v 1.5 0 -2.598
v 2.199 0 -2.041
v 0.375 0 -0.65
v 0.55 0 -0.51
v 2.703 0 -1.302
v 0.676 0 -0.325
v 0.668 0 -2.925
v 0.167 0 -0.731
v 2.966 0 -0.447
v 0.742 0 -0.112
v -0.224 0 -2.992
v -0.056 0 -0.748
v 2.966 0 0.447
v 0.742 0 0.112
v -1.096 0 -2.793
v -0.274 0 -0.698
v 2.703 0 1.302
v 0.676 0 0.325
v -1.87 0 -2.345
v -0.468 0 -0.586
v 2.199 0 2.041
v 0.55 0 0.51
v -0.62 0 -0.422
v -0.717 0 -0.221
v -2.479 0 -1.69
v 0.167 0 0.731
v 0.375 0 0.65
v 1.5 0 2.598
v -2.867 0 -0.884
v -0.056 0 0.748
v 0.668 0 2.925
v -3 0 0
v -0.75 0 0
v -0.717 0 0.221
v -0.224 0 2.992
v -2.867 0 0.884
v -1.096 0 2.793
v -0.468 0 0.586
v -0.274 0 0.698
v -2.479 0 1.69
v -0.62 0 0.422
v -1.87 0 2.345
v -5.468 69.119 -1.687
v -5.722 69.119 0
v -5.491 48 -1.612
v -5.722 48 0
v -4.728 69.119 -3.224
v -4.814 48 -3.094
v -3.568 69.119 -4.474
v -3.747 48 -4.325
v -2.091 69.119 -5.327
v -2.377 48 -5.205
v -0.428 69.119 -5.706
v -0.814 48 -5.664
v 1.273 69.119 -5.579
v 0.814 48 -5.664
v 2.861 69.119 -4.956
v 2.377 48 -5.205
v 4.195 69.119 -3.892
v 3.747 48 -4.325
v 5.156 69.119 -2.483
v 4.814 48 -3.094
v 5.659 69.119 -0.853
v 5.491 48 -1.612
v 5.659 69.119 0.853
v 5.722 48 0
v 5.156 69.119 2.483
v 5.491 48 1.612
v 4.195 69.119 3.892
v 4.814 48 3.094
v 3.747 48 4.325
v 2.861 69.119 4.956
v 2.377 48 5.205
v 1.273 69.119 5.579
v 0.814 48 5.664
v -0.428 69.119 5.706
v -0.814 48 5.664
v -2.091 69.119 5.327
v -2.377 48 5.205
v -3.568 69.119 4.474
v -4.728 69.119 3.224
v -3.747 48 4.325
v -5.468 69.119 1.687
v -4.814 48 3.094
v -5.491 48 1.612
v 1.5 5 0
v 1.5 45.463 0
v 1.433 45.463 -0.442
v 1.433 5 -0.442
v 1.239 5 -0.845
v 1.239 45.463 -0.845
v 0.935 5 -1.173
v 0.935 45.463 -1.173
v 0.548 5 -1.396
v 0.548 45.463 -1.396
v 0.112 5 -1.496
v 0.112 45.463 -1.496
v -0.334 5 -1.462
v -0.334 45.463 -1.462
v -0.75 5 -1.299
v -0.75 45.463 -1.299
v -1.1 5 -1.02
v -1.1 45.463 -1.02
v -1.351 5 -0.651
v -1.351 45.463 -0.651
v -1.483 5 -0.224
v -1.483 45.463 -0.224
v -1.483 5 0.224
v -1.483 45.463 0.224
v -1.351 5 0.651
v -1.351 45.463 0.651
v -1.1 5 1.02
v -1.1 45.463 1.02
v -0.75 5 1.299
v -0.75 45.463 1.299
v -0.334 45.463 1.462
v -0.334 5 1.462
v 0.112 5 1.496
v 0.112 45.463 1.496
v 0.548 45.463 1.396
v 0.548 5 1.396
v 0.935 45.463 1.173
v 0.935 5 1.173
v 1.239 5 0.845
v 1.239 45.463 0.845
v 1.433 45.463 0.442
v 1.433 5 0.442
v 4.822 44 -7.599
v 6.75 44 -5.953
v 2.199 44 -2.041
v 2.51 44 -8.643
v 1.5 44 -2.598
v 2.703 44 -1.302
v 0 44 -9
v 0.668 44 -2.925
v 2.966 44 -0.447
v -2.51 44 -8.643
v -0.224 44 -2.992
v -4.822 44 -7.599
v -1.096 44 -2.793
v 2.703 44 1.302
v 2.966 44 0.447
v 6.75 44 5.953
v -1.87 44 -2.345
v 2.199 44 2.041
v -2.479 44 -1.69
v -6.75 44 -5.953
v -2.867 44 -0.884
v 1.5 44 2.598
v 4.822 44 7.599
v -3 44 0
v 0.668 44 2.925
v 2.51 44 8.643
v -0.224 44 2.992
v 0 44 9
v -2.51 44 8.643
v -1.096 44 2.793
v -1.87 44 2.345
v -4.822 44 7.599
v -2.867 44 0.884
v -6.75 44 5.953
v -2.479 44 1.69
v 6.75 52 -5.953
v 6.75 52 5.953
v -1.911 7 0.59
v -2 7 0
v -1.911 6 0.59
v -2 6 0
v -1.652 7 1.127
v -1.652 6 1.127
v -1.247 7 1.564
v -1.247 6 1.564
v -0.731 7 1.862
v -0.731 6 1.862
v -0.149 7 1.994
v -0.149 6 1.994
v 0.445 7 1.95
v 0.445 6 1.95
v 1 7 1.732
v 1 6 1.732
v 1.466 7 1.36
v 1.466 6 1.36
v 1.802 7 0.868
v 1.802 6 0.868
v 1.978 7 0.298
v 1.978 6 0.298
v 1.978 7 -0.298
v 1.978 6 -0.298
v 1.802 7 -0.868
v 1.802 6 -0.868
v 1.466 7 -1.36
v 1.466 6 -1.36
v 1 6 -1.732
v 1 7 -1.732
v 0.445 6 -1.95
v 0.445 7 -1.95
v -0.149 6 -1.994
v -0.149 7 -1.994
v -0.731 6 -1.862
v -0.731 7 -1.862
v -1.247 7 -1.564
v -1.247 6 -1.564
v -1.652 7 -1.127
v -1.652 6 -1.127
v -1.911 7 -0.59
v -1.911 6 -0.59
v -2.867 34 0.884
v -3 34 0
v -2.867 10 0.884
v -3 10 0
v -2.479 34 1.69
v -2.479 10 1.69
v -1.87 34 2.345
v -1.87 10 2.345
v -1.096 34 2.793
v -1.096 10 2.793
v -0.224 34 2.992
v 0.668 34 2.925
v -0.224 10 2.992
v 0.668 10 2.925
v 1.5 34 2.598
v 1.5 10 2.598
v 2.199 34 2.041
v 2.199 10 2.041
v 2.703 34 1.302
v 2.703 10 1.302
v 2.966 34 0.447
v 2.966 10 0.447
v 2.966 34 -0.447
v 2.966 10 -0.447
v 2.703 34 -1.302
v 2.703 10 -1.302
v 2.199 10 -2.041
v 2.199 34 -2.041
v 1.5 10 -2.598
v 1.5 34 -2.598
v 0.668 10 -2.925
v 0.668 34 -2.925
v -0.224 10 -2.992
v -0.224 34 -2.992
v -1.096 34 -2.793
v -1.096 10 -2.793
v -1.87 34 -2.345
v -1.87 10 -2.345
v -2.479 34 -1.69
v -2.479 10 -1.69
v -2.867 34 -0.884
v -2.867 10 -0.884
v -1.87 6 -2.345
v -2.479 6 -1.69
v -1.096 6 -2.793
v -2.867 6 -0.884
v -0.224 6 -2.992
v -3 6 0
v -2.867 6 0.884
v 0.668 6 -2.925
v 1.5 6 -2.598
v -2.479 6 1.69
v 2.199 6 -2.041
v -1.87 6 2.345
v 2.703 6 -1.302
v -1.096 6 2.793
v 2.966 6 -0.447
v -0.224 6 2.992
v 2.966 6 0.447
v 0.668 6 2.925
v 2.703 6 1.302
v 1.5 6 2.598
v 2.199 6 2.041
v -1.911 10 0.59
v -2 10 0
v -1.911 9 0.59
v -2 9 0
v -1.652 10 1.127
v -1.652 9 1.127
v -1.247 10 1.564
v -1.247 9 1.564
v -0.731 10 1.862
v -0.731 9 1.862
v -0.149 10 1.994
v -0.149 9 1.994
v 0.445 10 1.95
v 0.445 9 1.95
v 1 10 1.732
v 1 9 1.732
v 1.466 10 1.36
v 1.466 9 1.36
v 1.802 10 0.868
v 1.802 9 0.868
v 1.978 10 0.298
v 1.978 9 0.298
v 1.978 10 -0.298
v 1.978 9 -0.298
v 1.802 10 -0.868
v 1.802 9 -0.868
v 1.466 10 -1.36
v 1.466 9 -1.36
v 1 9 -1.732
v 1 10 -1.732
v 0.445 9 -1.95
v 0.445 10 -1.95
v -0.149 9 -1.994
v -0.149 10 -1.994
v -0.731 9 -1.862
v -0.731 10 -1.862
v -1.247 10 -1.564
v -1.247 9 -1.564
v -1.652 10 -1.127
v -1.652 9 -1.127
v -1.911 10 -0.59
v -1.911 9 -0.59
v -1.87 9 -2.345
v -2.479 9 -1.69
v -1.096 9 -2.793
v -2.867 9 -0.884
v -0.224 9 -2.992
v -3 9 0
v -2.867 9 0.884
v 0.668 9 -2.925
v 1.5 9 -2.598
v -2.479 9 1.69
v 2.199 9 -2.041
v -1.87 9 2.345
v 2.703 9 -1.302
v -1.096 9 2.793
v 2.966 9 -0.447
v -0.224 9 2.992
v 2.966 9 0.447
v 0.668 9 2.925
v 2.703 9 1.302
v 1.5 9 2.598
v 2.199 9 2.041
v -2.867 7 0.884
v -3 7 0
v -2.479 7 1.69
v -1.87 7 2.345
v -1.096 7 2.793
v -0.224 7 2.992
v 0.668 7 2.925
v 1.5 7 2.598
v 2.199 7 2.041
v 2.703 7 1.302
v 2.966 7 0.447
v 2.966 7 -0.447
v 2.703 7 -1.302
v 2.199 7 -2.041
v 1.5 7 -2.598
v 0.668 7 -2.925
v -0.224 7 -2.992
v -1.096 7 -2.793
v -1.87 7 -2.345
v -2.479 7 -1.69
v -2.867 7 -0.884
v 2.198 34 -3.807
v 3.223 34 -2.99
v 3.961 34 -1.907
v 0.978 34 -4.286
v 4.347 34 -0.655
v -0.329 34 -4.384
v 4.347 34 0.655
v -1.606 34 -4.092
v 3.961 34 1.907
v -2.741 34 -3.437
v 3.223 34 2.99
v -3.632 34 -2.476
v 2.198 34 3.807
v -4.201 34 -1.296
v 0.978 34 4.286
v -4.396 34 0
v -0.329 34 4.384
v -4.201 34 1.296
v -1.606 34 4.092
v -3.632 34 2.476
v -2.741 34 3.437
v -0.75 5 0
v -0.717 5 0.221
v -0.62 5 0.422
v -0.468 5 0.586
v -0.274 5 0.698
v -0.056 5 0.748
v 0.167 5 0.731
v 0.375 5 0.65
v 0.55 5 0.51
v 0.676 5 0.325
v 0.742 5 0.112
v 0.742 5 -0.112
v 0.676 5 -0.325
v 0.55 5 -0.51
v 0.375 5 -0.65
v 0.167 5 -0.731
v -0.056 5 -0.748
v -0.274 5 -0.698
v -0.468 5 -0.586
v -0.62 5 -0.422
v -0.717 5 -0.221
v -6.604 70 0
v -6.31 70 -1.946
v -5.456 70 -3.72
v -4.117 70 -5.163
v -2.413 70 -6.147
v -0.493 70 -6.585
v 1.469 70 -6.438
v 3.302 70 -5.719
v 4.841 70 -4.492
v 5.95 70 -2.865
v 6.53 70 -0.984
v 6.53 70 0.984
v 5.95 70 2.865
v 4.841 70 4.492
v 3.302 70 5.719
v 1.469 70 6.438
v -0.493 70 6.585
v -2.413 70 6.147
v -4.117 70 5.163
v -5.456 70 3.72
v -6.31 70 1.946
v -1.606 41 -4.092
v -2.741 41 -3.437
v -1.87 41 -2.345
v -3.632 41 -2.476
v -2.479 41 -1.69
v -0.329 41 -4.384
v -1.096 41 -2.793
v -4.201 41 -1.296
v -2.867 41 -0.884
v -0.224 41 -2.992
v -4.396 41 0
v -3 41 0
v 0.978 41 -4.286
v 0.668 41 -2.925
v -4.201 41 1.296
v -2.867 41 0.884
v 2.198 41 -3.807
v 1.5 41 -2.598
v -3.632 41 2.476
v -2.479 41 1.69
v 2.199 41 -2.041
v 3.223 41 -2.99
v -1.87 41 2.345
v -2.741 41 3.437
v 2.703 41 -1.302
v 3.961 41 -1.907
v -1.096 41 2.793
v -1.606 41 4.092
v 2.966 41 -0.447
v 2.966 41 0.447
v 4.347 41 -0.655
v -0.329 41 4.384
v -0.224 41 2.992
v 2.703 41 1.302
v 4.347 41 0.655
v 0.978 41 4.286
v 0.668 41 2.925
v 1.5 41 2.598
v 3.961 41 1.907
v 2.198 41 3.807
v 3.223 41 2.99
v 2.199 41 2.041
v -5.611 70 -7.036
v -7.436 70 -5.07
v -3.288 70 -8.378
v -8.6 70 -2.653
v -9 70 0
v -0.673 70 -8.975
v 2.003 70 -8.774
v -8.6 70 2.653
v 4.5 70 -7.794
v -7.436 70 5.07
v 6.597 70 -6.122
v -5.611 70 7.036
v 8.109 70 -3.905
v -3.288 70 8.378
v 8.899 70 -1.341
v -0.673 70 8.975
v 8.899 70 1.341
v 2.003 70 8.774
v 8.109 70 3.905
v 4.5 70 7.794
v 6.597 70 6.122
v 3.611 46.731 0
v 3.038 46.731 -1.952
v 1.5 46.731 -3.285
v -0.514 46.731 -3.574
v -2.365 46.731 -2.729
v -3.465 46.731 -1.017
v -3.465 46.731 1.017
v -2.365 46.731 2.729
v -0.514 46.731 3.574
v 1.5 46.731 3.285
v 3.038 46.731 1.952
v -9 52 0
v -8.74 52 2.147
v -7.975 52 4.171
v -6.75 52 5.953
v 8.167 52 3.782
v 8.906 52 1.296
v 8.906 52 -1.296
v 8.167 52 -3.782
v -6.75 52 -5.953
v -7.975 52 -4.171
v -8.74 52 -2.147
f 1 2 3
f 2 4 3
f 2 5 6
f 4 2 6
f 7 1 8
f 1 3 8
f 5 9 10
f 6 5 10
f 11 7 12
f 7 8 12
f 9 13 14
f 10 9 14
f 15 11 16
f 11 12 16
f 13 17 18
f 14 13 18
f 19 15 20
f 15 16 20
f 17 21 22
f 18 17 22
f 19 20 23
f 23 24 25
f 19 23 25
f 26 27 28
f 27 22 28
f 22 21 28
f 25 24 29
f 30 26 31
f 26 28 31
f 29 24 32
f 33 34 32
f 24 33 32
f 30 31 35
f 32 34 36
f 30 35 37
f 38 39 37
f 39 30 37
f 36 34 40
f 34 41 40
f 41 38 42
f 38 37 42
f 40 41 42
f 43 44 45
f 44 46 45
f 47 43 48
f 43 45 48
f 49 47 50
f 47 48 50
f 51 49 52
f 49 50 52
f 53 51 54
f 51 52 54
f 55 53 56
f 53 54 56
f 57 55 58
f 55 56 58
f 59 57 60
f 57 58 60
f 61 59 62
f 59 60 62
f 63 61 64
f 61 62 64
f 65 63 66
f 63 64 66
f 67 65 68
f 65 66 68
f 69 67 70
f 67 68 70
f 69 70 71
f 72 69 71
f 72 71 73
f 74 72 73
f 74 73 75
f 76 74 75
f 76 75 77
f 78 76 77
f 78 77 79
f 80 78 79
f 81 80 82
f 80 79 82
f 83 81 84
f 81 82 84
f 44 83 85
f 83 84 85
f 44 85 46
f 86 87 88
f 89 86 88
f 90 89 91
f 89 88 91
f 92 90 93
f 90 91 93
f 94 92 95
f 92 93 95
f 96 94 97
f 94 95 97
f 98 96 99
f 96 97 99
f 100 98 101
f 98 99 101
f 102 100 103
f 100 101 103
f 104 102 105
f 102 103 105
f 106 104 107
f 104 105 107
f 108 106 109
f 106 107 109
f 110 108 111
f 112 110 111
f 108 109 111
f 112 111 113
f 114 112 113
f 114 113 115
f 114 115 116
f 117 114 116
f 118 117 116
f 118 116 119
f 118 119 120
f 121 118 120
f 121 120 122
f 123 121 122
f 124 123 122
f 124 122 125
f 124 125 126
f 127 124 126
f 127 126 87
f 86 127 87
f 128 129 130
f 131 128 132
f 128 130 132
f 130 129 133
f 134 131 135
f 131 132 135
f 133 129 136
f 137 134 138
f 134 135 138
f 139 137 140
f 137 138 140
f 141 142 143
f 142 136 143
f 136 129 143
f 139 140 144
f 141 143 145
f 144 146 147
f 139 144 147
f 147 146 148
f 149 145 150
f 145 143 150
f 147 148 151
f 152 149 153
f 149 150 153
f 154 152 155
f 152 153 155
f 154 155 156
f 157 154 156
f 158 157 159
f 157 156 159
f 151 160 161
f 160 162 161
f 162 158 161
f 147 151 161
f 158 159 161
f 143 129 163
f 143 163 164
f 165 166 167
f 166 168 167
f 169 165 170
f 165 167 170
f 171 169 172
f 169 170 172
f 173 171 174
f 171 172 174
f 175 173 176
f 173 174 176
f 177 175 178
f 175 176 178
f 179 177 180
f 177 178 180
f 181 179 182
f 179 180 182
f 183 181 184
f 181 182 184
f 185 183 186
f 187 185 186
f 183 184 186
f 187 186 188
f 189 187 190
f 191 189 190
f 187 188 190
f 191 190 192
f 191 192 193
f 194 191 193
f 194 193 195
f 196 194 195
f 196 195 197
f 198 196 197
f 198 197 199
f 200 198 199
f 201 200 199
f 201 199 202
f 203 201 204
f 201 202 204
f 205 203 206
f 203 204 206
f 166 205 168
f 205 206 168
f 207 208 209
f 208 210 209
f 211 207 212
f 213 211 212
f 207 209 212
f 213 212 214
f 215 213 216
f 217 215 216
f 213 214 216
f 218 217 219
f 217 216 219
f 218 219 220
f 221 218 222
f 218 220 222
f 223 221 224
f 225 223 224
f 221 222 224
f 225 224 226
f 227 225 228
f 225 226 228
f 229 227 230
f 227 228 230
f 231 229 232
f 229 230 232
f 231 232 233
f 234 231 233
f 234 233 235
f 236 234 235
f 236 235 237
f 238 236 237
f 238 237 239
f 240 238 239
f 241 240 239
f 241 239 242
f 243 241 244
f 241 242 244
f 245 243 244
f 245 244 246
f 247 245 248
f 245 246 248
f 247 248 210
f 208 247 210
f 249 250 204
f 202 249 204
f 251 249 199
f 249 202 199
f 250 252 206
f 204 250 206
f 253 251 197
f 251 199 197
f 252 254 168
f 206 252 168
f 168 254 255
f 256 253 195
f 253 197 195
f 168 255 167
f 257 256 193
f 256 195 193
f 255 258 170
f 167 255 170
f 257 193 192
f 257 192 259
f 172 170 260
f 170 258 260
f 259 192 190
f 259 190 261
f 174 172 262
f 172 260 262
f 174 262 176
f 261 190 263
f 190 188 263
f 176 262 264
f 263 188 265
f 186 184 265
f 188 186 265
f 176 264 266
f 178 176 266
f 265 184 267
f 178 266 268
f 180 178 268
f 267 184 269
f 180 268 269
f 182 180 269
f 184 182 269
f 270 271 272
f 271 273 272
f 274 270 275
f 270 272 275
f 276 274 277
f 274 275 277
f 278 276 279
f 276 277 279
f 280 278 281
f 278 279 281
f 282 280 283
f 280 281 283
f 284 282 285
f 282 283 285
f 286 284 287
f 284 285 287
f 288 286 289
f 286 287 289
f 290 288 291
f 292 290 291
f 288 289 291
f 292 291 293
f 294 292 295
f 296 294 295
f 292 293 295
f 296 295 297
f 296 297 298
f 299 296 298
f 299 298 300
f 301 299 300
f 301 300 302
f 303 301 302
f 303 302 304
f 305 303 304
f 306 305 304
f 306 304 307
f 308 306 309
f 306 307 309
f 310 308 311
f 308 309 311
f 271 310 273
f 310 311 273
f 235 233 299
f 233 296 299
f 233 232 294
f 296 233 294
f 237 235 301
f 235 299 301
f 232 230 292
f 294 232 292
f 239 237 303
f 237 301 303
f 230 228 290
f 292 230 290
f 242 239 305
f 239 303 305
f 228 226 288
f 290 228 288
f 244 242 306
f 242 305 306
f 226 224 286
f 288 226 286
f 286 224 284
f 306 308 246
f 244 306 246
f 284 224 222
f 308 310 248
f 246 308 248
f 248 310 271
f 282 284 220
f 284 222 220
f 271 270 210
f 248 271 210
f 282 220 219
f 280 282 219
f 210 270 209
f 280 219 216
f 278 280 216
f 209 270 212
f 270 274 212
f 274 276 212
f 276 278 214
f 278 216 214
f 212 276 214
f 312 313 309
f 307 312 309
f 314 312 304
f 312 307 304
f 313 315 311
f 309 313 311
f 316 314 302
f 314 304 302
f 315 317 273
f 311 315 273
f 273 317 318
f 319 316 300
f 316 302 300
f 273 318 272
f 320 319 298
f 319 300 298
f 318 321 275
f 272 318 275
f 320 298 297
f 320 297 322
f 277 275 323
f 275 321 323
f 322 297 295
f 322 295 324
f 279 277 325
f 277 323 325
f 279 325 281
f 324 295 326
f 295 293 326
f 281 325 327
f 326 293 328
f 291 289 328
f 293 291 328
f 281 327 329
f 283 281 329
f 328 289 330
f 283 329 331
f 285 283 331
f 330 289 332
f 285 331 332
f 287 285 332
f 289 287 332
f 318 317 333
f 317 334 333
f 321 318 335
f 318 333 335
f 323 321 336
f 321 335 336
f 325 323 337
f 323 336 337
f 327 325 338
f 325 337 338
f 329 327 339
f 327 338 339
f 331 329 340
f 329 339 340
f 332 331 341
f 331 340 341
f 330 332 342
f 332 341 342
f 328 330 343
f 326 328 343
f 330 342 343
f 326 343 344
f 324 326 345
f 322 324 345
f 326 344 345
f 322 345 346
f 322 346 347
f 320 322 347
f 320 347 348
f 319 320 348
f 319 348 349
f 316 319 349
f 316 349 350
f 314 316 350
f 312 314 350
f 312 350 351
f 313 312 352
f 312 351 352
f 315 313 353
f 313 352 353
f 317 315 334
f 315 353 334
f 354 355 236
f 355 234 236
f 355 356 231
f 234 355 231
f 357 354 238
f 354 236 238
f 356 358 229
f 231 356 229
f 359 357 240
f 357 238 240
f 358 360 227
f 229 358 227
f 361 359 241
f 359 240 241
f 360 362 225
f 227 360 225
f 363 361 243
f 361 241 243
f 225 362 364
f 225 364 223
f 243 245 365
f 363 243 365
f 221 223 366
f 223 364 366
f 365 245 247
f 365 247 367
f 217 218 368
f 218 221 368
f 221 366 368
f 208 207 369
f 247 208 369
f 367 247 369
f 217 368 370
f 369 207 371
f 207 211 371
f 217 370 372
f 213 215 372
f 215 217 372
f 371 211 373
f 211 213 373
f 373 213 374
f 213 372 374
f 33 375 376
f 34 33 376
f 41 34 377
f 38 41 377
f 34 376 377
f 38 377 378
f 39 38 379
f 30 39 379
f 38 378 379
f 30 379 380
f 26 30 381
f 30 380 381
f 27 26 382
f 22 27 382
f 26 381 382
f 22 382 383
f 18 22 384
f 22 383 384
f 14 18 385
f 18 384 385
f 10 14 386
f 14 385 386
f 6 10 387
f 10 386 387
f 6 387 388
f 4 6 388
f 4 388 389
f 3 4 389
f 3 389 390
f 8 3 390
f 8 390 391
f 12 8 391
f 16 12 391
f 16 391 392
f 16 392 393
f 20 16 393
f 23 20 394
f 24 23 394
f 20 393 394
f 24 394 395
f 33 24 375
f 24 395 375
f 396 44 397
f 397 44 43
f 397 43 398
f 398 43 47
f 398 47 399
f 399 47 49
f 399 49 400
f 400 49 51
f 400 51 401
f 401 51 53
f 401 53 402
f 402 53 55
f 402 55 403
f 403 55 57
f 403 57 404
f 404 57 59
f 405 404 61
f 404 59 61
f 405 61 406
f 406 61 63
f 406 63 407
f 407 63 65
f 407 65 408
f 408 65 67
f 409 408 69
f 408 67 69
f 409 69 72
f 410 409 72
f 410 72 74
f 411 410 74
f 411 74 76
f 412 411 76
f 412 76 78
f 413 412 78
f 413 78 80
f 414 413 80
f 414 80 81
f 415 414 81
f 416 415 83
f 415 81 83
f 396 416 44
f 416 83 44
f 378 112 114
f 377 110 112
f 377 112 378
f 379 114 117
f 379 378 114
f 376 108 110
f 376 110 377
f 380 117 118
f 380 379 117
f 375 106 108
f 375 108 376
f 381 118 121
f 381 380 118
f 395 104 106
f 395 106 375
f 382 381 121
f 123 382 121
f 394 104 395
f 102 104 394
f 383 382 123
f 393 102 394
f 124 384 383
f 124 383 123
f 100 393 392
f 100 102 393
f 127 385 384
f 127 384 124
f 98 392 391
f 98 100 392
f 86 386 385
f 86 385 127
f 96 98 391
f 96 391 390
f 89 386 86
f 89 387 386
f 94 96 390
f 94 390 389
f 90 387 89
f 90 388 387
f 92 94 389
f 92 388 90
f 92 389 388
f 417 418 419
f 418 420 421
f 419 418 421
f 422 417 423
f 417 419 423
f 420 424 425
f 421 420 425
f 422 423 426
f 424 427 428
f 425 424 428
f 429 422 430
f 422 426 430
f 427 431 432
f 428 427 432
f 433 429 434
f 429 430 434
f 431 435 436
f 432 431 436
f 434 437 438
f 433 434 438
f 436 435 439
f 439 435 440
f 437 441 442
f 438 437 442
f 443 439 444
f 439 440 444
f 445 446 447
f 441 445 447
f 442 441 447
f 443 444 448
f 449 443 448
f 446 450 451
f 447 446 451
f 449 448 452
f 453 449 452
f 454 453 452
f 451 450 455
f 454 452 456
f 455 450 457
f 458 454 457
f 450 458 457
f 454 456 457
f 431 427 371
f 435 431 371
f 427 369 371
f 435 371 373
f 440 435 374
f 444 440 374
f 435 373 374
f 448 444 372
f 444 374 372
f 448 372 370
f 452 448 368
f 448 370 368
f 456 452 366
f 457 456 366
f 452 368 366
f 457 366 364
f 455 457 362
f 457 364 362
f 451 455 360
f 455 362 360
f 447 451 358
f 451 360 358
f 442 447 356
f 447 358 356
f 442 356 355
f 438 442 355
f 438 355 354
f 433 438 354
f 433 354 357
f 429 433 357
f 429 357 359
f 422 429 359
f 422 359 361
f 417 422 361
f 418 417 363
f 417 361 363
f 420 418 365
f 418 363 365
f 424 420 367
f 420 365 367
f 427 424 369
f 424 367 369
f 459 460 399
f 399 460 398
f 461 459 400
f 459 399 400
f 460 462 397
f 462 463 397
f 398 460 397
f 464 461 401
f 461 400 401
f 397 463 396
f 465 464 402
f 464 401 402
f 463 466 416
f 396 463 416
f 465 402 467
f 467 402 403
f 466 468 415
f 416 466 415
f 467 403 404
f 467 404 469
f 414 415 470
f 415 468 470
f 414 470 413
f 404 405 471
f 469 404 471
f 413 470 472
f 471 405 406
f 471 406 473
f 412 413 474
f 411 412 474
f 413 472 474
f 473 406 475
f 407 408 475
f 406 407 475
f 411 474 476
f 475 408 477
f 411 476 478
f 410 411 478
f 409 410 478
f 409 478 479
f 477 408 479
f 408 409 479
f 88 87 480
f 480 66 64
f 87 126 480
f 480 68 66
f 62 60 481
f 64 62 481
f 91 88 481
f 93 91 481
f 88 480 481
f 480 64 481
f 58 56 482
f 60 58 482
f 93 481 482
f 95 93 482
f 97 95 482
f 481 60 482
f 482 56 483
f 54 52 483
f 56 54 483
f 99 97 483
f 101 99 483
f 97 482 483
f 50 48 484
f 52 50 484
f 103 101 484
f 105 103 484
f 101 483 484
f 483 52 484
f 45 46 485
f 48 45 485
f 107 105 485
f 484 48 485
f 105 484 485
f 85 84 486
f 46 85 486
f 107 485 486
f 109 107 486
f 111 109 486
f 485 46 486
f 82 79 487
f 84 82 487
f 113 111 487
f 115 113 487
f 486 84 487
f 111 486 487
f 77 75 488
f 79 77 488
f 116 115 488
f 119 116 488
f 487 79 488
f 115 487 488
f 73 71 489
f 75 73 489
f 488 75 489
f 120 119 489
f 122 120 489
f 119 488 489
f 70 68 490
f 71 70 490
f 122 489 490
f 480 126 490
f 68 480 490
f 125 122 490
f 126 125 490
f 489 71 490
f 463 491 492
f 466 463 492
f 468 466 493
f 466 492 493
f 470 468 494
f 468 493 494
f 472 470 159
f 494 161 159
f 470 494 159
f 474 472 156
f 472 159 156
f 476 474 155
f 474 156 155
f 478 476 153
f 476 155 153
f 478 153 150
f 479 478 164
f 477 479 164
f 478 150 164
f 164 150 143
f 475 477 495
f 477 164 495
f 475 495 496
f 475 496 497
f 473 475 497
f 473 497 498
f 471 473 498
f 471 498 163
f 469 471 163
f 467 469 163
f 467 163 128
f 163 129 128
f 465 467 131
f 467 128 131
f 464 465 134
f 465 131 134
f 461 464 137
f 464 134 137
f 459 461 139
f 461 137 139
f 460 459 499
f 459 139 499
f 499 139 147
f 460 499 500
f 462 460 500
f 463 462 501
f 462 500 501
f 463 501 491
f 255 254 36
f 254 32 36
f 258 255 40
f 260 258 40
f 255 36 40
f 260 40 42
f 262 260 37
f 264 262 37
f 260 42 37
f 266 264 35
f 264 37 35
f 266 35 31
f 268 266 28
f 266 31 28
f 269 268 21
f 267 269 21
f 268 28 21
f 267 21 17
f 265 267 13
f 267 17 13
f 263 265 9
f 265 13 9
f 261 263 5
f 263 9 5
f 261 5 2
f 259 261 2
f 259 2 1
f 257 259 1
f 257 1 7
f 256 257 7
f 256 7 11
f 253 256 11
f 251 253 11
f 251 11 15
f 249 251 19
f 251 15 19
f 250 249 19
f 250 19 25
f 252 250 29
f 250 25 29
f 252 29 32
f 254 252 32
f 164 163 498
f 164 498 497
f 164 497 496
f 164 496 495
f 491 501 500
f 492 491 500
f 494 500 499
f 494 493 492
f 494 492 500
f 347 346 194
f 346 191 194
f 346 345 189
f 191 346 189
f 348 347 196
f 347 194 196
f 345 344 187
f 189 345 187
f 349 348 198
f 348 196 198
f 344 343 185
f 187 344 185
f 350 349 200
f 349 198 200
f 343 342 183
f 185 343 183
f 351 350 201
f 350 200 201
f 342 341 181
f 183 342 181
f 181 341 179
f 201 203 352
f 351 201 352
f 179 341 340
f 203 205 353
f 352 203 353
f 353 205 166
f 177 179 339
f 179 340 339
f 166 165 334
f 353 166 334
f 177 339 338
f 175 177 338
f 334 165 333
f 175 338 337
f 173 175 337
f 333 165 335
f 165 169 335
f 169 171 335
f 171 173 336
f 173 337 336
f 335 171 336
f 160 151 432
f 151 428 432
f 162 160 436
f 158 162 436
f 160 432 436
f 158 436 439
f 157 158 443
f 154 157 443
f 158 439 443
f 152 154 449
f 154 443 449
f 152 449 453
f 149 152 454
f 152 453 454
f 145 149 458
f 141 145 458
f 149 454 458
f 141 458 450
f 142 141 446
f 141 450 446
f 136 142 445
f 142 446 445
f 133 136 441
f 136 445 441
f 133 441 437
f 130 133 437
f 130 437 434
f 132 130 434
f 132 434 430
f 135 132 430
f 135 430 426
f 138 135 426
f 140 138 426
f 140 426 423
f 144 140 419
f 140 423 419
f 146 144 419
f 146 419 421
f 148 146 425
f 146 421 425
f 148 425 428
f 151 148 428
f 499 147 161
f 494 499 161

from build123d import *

# Parameters (mm, degrees)
SKETCH17_R                    = 1.5
CUT_EXTRUDE1_DEPTH            = 65
G1_4_TAPPED_HOLE1_D           = 11.445
G1_4_TAPPED_HOLE1_DEPTH       = 22
G1_4_TAPPED_HOLE1_CSINK_D     = 13.207
G1_4_TAPPED_HOLE1_CSINK_ANGLE = 90
G1_4_TAPPED_HOLE1_TIP         = 3.438424892
SKETCH18_W                    = 13.595594723
SKETCH18_H                    = 16.071338344
CUT_EXTRUDE2_DEPTH            = 8


with BuildPart() as part:
    # Sketch1 → Revolve1 (revolve)
    with BuildSketch(Plane.XY):
        Polygon((-0.75, 0), (-0.75, 70), (-9, 70), (-9, 44), (-3, 44), (-3, 41), (-4.396039606, 41), (-4.396039606, 34), (-3, 34), (-3, 10), (-2, 10), (-2, 9), (-3, 9), (-3, 7), (-2, 7), (-2, 6), (-3, 6), (-3, 0), align=None)
    revolve(axis=Axis((0, 0, 0), (0, 1, 0)))

    # Sketch17 → Cut-Extrude1 (cut)
    with BuildSketch(Plane(origin=(0, 70, 0), x_dir=(1, 0, 0), z_dir=(0, 1, 0))):
        Circle(SKETCH17_R)
    extrude(amount=-CUT_EXTRUDE1_DEPTH, mode=Mode.SUBTRACT)

    # G1/4 Tapped Hole1
    with Locations(Plane(origin=(0, 70, 0), x_dir=(1, 0, 0), z_dir=(0, 1, 0))):
        with Locations((0, 0)):
            CounterSinkHole(G1_4_TAPPED_HOLE1_D / 2, G1_4_TAPPED_HOLE1_CSINK_D / 2, depth=G1_4_TAPPED_HOLE1_DEPTH, counter_sink_angle=G1_4_TAPPED_HOLE1_CSINK_ANGLE)
            with Locations((0, 0, -(G1_4_TAPPED_HOLE1_DEPTH + G1_4_TAPPED_HOLE1_TIP / 2))):  # 118° drill point
                Cone(0, G1_4_TAPPED_HOLE1_D / 2, G1_4_TAPPED_HOLE1_TIP, mode=Mode.SUBTRACT)

    # Sketch18 → Cut-Extrude2 (cut)
    with BuildSketch(Plane.XZ.offset(-44)):
        with Locations((-13.547797362, 0)):
            Rectangle(SKETCH18_W, SKETCH18_H)
        with Locations((13.547797362, 0)):
            Rectangle(SKETCH18_W, SKETCH18_H)
    extrude(amount=-CUT_EXTRUDE2_DEPTH, mode=Mode.SUBTRACT)


solid = part.part
